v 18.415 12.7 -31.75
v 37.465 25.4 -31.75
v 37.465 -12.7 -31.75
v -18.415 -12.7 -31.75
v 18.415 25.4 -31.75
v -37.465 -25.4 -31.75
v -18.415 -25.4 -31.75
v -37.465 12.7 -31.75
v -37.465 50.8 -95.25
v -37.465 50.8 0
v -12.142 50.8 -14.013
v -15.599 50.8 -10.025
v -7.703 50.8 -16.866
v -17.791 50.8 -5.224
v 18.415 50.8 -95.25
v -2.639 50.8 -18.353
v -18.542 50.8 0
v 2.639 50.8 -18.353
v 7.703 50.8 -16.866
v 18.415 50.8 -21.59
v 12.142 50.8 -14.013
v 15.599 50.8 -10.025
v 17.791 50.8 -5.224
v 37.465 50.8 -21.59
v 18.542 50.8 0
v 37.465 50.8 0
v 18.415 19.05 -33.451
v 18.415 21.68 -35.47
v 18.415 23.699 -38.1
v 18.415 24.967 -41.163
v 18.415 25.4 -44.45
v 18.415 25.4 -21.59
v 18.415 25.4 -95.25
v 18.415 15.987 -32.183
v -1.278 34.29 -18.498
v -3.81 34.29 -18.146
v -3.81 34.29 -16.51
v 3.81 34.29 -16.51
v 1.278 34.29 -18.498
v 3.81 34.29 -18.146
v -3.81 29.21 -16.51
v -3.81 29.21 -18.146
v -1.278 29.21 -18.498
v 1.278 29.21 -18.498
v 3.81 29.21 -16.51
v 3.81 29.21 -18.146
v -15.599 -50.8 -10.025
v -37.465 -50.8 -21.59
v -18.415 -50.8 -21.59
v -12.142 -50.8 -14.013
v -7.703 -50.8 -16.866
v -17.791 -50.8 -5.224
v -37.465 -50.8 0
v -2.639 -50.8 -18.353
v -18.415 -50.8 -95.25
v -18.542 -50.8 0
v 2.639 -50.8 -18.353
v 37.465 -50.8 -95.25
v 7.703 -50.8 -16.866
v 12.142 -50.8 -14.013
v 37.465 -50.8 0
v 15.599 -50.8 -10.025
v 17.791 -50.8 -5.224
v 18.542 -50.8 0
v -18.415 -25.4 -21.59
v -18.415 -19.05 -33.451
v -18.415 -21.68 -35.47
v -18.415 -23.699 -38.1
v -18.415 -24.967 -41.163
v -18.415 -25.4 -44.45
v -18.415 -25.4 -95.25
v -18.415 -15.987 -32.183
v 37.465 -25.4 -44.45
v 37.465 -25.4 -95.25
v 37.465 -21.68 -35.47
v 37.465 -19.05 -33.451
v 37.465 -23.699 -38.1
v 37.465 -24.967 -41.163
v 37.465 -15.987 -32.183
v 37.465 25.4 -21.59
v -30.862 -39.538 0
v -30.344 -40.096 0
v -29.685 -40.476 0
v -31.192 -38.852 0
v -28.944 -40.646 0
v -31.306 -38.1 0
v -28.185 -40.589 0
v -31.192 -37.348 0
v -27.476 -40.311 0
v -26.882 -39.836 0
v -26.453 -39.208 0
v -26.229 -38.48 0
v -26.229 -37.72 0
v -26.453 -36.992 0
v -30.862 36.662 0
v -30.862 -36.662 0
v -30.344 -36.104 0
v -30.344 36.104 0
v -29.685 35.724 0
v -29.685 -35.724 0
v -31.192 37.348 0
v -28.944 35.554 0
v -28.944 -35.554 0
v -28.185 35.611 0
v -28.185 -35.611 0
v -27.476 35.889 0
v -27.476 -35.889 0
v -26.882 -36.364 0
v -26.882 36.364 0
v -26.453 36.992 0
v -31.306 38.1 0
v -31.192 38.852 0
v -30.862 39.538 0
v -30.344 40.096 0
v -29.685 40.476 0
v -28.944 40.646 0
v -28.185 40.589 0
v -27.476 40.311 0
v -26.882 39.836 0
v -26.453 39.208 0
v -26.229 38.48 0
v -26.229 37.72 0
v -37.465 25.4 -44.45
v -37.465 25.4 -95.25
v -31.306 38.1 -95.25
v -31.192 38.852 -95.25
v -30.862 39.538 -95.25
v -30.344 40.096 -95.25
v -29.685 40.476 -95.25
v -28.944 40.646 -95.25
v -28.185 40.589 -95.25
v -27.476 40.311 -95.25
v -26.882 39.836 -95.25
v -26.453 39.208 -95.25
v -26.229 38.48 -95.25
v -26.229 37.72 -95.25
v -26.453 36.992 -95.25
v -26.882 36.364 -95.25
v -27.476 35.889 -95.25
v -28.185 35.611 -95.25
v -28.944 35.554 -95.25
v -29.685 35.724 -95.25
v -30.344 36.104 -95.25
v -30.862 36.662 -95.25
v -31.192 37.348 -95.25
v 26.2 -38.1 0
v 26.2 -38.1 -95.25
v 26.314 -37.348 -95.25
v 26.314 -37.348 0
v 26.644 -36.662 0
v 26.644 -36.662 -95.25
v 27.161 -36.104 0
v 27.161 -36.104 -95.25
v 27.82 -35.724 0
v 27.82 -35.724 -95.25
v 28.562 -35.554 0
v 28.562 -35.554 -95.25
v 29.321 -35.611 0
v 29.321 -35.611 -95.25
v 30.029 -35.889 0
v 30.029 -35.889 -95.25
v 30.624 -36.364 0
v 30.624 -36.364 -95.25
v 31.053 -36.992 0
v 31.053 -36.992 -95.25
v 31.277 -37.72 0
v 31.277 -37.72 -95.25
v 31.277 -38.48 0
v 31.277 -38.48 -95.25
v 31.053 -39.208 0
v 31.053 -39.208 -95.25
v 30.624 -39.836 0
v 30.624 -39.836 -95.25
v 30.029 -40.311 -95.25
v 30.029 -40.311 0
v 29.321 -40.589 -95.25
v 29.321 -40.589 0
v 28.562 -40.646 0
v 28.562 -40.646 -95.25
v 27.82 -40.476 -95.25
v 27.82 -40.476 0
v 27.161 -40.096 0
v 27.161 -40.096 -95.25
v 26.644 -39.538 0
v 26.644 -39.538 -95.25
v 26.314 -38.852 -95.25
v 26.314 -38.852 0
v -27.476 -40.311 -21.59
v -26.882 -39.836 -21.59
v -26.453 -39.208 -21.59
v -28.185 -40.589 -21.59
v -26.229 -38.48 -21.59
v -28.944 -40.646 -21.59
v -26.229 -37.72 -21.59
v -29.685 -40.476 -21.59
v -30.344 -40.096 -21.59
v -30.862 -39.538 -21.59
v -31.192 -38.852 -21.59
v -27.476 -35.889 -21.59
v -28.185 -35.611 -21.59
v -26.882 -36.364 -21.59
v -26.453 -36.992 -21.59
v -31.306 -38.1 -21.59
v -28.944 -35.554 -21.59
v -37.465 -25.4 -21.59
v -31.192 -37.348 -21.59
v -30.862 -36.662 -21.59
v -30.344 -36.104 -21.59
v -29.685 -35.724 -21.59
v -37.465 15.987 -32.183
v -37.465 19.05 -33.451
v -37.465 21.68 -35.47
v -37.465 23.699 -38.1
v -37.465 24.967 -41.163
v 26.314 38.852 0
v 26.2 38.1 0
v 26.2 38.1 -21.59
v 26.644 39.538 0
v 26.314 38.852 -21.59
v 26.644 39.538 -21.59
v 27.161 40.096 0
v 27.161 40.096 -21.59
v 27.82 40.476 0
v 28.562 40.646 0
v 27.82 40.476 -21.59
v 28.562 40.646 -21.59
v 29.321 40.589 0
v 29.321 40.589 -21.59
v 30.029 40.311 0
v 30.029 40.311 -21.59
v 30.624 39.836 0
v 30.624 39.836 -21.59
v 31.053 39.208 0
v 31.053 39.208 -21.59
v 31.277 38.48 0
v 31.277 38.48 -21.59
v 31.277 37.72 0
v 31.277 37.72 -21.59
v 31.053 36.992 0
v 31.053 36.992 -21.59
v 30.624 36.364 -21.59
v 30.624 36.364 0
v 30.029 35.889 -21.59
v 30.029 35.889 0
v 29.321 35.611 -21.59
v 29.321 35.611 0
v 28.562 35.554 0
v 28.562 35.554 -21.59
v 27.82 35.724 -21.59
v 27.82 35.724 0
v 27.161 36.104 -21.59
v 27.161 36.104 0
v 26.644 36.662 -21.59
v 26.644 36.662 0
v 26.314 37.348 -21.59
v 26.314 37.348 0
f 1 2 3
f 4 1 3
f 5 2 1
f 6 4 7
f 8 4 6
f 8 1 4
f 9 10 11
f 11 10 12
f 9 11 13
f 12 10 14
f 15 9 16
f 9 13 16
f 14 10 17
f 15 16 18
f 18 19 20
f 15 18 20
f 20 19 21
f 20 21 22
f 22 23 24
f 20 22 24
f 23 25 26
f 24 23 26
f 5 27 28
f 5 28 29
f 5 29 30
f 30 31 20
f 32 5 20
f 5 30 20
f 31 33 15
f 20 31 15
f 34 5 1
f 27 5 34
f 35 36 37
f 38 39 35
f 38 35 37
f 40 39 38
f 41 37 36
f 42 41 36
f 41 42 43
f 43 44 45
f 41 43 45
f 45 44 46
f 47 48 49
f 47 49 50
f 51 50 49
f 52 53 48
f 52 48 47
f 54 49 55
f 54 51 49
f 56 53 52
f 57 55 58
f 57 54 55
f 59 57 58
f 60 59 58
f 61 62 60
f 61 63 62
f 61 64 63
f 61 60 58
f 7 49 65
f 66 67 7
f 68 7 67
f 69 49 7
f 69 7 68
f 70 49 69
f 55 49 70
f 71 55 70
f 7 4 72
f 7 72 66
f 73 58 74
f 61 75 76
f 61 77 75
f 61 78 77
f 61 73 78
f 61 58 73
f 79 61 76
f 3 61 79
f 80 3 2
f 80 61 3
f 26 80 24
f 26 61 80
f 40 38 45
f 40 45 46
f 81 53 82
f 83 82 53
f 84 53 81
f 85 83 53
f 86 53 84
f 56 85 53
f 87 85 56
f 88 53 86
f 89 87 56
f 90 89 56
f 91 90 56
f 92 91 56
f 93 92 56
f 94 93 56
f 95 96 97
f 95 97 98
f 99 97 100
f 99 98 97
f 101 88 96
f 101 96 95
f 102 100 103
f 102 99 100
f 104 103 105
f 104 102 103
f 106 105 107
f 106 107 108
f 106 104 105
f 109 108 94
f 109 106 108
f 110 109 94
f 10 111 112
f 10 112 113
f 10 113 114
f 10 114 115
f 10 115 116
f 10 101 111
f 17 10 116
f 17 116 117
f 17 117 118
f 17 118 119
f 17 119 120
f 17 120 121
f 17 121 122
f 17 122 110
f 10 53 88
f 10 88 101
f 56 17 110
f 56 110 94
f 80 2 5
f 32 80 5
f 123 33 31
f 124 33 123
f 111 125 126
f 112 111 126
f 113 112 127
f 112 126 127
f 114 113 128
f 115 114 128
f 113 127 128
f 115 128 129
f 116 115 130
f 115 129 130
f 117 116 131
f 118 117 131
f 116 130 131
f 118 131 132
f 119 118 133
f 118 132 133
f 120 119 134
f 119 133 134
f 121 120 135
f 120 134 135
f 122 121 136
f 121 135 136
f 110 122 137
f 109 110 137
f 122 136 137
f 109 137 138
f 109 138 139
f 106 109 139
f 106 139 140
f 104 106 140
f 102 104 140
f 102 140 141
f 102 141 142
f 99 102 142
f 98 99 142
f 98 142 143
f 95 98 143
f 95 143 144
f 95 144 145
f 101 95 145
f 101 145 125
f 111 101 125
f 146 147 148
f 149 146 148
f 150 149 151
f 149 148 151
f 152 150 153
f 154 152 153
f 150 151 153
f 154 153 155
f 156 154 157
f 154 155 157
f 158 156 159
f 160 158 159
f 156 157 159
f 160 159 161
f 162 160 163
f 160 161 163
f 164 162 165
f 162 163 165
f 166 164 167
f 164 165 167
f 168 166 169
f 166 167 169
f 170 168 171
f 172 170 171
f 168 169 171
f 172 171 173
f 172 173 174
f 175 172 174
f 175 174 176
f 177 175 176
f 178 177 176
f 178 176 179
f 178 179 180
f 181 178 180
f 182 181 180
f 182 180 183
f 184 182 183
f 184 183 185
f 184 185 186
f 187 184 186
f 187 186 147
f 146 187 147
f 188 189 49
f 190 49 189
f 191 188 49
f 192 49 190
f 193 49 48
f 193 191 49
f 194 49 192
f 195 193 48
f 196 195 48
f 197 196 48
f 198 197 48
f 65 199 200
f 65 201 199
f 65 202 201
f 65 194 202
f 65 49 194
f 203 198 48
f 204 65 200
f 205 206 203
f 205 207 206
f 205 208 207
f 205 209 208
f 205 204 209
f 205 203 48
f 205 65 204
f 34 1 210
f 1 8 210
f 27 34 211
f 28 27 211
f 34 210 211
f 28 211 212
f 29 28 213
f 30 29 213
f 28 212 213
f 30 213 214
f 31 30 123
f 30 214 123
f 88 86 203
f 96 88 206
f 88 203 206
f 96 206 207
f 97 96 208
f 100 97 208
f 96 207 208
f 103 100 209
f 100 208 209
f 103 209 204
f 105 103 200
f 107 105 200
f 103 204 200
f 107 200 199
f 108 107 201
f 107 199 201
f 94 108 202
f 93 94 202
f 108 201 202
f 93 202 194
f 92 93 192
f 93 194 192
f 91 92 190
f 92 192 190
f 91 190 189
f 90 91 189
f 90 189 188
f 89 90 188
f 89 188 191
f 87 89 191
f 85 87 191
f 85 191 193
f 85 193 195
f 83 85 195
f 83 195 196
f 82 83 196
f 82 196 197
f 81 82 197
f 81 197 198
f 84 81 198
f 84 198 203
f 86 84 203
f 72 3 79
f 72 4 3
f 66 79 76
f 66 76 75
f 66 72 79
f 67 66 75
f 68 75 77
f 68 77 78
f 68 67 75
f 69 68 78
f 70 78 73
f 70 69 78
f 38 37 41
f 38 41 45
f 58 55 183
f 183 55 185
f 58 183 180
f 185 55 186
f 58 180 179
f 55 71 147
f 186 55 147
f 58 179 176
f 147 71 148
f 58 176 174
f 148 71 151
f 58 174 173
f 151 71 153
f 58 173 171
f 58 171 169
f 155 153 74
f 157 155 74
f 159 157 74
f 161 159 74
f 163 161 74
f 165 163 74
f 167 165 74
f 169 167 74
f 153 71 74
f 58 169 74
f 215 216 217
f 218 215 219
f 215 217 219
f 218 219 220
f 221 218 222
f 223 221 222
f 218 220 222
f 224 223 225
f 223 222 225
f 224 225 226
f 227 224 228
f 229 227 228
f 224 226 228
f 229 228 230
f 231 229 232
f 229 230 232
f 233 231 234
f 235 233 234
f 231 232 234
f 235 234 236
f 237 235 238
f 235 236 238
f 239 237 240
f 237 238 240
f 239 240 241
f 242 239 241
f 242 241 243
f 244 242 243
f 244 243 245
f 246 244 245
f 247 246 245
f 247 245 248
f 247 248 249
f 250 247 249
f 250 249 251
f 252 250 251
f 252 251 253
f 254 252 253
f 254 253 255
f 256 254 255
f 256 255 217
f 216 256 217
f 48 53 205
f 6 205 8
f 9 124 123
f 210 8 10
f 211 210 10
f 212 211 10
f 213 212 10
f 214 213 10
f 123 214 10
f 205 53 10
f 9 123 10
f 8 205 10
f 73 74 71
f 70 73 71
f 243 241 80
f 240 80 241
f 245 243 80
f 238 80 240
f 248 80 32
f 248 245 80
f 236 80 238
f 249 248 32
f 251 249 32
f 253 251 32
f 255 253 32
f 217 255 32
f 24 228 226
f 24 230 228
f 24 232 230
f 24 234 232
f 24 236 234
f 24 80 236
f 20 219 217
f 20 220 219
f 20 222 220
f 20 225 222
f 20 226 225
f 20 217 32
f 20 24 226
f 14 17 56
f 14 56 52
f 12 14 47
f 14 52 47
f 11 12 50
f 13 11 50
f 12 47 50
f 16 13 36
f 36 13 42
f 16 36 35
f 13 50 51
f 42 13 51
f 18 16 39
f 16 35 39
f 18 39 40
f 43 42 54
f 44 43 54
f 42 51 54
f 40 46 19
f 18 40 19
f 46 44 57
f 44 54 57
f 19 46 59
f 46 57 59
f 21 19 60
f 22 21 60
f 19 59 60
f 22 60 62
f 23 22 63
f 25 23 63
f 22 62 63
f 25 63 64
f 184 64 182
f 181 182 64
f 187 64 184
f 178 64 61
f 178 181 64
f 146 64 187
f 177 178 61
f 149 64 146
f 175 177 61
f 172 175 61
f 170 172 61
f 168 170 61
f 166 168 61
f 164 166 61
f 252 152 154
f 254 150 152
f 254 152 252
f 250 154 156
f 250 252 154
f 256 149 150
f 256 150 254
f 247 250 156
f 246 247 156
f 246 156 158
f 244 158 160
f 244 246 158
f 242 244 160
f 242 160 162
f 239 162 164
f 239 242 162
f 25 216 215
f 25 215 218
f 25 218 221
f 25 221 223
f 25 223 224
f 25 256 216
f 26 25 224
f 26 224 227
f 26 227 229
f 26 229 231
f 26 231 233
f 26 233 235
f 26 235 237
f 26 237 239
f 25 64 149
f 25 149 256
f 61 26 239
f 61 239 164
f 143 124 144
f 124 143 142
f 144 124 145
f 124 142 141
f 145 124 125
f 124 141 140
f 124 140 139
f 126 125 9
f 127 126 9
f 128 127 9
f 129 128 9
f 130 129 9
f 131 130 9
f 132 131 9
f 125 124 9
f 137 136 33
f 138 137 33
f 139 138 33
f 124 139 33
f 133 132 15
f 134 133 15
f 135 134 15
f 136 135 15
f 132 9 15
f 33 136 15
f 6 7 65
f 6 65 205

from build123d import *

# Parameters (mm, degrees)
SKETCH1_W                   = 74.93
SKETCH1_H                   = 101.6
BOSS_EXTRUDE2_DEPTH         = 95.25
CUT_EXTRUDE2_DEPTH          = 145.217712938
CUT_EXTRUDE2_DEPTH_BACK     = 145.217712938
SKETCH4_W                   = 7.62
SKETCH4_H                   = 78.74
BOSS_EXTRUDE3_DEPTH         = 2.54
TAP_DRILL_FOR_1_4_20_TAP1_D = 5.1054
SKETCH9_W                   = 19.05
SKETCH9_H                   = 25.4
CUT_EXTRUDE3_DEPTH          = 73.66
SKETCH10_W                  = 74.93
SKETCH10_H                  = 50.8
CUT_EXTRUDE4_DEPTH          = 63.5
FILLET1_R                   = 12.7


with BuildPart() as part:
    # Sketch1 → Boss-Extrude2 (new body)
    with BuildSketch(Plane.XY):
        Rectangle(SKETCH1_W, SKETCH1_H)
    extrude(amount=-BOSS_EXTRUDE2_DEPTH)

    # Sketch2 → Cut-Extrude2 (cut, two sides: drawn at the far end of the back side and taken through both)
    with BuildSketch(Plane(origin=(0, 50.8, 0), x_dir=(1, 0, 0), z_dir=(0, 1, 0)).offset(-CUT_EXTRUDE2_DEPTH_BACK)):
        with BuildLine():
            Line((-18.542, -230.991823822), (-18.542, 0))
            ThreePointArc((-18.542, 0), (0, 18.542), (18.542, 0))
            Line((18.542, 0), (18.542, -230.991823822))
            Line((18.542, -230.991823822), (18.542, -692.975471465))
            Line((18.542, -692.975471465), (-18.542, -692.975471465))
            Line((-18.542, -692.975471465), (-18.542, -230.991823822))
        make_face()
    extrude(amount=CUT_EXTRUDE2_DEPTH + CUT_EXTRUDE2_DEPTH_BACK, mode=Mode.SUBTRACT)

    # Sketch4 → Boss-Extrude3 (add, symmetric)
    with BuildSketch(Plane(origin=(0, 31.75, 0), x_dir=(1, 0, 0), z_dir=(0, 1, 0))):
        with Locations((0, 55.88)):
            Rectangle(SKETCH4_W, SKETCH4_H)
    extrude(amount=BOSS_EXTRUDE3_DEPTH, both=True)

    # Tap Drill for 1/4-20 Tap1 (through all)
    with Locations(Plane.XY):
        with Locations((-28.7528, 38.1), (28.7528, 38.1), (-28.7528, -38.1), (28.7528, -38.1)):
            Hole(TAP_DRILL_FOR_1_4_20_TAP1_D / 2)

    # Sketch9 → Cut-Extrude3 (cut)
    with BuildSketch(Plane(origin=(0, 0, -95.25), x_dir=(-1, 0, 0), z_dir=(0, 0, -1))):
        with Locations((-27.94, 38.1)):
            Rectangle(SKETCH9_W, SKETCH9_H)
        with Locations((27.94, -38.1)):
            Rectangle(SKETCH9_W, SKETCH9_H)
    extrude(amount=-CUT_EXTRUDE3_DEPTH, mode=Mode.SUBTRACT)

    # Sketch10 → Cut-Extrude4 (cut)
    with BuildSketch(Plane(origin=(0, 0, -95.25), x_dir=(-1, 0, 0), z_dir=(0, 0, -1))):
        Rectangle(SKETCH10_W, SKETCH10_H)
    extrude(amount=-CUT_EXTRUDE4_DEPTH, mode=Mode.SUBTRACT)

    # Fillet1
    fillet1_edges = [part.edges().sort_by_distance(p)[0] for p in [
        (-9.525, 25.4, -31.75),
        (9.525, -25.4, -31.75),
    ]]
    fillet(fillet1_edges, radius=FILLET1_R)


solid = part.part
